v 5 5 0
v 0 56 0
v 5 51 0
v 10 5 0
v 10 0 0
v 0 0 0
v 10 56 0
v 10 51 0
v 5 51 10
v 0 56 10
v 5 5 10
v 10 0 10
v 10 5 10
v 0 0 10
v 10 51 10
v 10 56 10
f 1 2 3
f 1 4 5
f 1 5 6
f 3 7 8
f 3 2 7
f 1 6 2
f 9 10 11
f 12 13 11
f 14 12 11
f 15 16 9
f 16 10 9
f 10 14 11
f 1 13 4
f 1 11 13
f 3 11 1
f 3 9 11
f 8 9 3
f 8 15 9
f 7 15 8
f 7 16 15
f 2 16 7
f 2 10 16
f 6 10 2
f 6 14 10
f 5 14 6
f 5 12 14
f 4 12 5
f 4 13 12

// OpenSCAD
// a bracket to mount a Korg Volca Sample to a 19" rack

// from https://www.korg.com/us/products/dj/volca_sample/specifications.php
volca_height = 115;
volca_width = 193;
volca_depth = 45;  // is this the body only or does it include the knobs?

module side_clamp() {
  /*
    _______
    |   __| B
    |  |
    |  |_C_
    |_____| B
      A
  */

  A = 10;
  B = 5;
  C = 5;
  thickness = 10; // how far this profile is extruded
  clamp_gap = 1;  // fudge factor for the clamp

  profile = [
    [0,0], [A,0], [A,B], [A-C,B],
    [A-C,B+volca_depth+clamp_gap,],
    [A,B+volca_depth+clamp_gap],
    [A,2*B+volca_depth+clamp_gap],
    [0,2*B+volca_depth+clamp_gap]
  ];

  linear_extrude(thickness)
    polygon(profile);
}

side_clamp();
